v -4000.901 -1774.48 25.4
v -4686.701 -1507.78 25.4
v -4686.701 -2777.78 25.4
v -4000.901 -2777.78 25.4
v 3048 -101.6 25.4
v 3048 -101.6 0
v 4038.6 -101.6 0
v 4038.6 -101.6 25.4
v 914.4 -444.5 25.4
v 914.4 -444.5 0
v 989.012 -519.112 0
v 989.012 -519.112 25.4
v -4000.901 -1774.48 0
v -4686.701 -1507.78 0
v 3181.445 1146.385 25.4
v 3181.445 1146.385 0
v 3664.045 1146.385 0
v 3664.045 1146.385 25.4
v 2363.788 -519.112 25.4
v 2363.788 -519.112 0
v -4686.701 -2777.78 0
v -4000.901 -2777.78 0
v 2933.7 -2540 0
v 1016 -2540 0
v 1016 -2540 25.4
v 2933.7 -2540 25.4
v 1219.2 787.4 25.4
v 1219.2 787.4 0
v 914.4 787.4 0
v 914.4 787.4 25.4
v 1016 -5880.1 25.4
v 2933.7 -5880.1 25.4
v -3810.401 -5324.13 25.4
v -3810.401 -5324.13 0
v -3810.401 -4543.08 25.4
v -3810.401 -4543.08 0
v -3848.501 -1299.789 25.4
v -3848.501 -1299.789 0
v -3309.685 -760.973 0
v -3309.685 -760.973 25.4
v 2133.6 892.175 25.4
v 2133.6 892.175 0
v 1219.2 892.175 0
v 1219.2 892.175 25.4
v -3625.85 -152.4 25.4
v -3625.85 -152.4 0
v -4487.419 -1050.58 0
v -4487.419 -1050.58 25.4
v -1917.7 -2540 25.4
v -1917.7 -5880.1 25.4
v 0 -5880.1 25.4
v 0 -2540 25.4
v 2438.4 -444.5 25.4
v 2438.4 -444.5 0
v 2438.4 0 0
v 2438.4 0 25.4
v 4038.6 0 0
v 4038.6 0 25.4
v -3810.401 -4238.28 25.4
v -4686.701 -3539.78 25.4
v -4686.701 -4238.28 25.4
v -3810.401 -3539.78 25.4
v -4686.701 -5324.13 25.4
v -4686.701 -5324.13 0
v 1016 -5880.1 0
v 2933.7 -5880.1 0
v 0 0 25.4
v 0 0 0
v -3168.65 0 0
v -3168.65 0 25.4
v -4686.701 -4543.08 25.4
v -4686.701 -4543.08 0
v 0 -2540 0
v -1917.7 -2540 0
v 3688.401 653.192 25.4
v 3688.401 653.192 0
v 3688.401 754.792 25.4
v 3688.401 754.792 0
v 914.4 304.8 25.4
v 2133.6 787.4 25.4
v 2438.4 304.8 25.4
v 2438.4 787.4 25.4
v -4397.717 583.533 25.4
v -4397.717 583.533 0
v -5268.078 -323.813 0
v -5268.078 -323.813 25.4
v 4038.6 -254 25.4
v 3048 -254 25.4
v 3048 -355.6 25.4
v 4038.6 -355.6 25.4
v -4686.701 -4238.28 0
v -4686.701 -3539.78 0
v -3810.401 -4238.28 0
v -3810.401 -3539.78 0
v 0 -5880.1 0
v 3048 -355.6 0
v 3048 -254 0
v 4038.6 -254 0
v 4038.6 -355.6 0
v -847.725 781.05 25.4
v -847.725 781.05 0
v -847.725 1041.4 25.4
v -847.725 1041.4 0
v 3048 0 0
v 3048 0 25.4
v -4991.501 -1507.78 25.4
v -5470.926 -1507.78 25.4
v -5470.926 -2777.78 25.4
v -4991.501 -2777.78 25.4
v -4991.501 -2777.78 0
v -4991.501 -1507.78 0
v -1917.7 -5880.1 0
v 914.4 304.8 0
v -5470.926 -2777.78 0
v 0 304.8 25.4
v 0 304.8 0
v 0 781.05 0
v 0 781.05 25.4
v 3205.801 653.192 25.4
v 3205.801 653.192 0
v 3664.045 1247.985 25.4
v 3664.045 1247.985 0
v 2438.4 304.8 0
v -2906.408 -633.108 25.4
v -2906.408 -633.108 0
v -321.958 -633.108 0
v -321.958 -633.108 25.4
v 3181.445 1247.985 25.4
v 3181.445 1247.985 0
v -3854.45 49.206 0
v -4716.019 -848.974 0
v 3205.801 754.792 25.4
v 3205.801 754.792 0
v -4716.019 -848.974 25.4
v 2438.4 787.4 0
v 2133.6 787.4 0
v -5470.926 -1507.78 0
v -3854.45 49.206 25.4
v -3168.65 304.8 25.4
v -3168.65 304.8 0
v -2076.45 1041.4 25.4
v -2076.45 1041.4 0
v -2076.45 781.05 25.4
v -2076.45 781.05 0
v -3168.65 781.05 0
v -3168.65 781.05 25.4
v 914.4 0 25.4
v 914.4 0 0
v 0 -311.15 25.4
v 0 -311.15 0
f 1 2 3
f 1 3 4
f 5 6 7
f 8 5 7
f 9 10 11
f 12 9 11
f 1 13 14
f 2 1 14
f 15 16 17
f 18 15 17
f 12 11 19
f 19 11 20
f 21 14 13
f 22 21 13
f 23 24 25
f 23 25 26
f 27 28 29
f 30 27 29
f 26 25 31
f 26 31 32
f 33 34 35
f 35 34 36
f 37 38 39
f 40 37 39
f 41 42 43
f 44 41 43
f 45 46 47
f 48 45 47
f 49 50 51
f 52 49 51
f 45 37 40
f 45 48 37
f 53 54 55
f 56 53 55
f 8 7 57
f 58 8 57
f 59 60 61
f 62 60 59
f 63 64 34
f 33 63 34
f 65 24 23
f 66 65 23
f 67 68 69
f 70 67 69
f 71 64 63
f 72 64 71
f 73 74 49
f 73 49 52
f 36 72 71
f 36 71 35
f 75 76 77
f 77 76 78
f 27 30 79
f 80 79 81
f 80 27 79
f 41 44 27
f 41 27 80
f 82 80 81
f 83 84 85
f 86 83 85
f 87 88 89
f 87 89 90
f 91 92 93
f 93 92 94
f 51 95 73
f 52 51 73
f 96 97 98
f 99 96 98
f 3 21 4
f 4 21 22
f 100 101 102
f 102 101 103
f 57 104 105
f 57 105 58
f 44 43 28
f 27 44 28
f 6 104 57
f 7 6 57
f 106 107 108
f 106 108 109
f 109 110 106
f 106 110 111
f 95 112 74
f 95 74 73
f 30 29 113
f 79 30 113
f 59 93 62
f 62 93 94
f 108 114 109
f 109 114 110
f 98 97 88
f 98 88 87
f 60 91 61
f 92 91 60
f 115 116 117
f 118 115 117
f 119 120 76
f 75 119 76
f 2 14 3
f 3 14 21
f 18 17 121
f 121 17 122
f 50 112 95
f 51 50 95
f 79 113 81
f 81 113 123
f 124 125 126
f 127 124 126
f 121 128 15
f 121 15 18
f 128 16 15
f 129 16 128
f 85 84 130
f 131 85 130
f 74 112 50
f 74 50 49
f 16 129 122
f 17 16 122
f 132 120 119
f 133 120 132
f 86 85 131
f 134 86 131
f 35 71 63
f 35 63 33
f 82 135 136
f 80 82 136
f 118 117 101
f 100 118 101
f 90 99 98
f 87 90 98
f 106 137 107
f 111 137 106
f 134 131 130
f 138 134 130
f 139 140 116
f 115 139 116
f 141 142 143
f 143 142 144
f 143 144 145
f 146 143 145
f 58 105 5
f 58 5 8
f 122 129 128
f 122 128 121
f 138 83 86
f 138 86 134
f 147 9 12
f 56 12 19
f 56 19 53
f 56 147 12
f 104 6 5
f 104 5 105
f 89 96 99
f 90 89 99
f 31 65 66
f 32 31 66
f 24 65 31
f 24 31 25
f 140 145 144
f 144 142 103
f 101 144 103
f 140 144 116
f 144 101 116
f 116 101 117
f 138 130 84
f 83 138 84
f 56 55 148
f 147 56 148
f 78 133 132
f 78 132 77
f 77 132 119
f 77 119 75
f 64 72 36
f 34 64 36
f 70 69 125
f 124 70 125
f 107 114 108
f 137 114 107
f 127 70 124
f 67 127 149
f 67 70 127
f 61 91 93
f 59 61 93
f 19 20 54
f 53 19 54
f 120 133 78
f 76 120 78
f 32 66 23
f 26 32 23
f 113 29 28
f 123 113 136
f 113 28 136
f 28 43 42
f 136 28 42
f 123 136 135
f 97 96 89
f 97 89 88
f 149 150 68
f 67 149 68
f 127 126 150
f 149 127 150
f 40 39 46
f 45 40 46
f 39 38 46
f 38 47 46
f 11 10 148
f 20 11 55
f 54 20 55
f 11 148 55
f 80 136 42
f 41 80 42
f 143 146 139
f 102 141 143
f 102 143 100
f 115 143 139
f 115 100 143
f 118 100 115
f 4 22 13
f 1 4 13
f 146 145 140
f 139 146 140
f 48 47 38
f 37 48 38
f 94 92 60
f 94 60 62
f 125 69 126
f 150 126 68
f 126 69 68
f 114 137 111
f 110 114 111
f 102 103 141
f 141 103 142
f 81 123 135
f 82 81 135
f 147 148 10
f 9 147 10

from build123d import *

# Parameters (mm, degrees)
F0_W     = 876.3
F0_H     = 698.5
F0_H_2   = 781.05
F0_W_2   = 1917.7
F0_H_3   = 3340.1
F0_W_3   = 479.425
F0_H_4   = 1270
F0_W_4   = 990.6
F0_H_5   = 101.6
F0_W_5   = 482.6
F1_DEPTH = 25.4


with BuildPart() as f1:
    # F0 (on Top) → F1 (new body)
    with BuildSketch(Plane.XY):
        Polygon((-3848.500829, -1299.788802), (-3309.685462, -760.973434), (-3625.85, -152.4), (-4487.419216, -1050.580185), align=None)
        Polygon((0, 0), (-3168.65, 0), (-2906.408057, -633.108057), (-321.958057, -633.108057), (0, -311.15), align=None)
        Polygon((-2076.45, 781.05), (-3168.65, 781.05), (-3168.65, 304.8), (0, 304.8), (0, 781.05), (-847.725, 781.05), (-847.725, 1041.4), (-2076.45, 1041.4), align=None)
        Polygon((-4000.900829, -1774.480185), (-4686.700829, -1507.780185), (-4686.700829, -2777.780185), (-4000.900829, -2777.780185), align=None)
        with Locations((-4248.550829, -3889.030185)):
            Rectangle(F0_W, F0_H)
        with Locations((-4248.550829, -4933.605185)):
            Rectangle(F0_W, F0_H_2)
        with Locations((-958.85, -4210.05)):
            Rectangle(F0_W_2, F0_H_3)
        with Locations((1974.85, -4210.05)):
            Rectangle(F0_W_2, F0_H_3)
        with Locations((-5231.213329, -2142.780185)):
            Rectangle(F0_W_3, F0_H_4)
        Polygon((1219.2, 787.4), (914.4, 787.4), (914.4, 304.8), (2438.4, 304.8), (2438.4, 787.4), (2133.6, 787.4), (2133.6, 892.175), (1219.2, 892.175), align=None)
        Polygon((2438.4, 0), (914.4, 0), (914.4, -444.5), (989.0125, -519.1125), (2363.7875, -519.1125), (2438.4, -444.5), align=None)
        Polygon((-4716.019216, -848.973935), (-3854.45, 49.20625), (-4397.717302, 583.532591), (-5268.078041, -323.812699), align=None)
        with Locations((3543.3, -50.8)):
            Rectangle(F0_W_4, F0_H_5)
        with Locations((3543.3, -304.8)):
            Rectangle(F0_W_4, F0_H_5)
        with Locations((3422.74536, 1197.185312)):
            Rectangle(F0_W_5, F0_H_5)
        with Locations((3447.100533, 703.992163)):
            Rectangle(F0_W_5, F0_H_5)
    extrude(amount=F1_DEPTH)


solid = f1.part
